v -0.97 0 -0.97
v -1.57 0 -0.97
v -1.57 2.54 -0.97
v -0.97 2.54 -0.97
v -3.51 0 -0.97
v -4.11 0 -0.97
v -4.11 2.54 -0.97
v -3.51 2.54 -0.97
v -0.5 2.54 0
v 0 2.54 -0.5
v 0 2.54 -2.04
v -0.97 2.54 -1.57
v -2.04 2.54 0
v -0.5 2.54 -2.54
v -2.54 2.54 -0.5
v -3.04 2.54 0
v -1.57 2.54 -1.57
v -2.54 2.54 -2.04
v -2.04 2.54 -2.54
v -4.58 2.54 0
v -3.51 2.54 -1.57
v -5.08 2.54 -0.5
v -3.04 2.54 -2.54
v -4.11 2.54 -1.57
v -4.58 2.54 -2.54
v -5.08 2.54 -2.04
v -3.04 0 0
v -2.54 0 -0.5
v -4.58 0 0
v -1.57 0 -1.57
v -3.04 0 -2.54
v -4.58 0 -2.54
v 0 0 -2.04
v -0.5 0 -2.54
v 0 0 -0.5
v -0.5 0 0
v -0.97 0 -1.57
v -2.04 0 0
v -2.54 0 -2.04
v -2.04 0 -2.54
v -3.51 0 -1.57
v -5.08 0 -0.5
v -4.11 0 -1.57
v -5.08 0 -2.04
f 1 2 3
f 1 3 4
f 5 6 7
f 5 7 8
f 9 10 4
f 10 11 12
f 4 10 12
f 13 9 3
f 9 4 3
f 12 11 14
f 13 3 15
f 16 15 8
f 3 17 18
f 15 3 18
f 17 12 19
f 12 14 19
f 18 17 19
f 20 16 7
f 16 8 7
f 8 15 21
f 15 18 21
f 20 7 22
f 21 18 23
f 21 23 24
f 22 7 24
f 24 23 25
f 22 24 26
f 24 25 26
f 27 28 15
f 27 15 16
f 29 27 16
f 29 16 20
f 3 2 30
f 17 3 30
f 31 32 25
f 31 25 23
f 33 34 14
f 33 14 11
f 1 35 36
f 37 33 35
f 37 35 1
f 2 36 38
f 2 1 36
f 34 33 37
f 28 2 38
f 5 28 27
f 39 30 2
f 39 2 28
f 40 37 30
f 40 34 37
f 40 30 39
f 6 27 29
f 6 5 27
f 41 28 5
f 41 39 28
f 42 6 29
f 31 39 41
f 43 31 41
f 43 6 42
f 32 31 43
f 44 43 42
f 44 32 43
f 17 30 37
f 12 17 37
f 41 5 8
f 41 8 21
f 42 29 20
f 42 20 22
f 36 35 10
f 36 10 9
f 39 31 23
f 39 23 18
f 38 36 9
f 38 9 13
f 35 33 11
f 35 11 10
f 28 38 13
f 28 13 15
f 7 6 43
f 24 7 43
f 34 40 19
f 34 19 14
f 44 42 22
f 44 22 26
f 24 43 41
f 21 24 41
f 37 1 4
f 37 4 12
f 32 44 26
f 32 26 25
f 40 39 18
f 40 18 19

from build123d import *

# Parameters (mm, degrees)
SKETCH1_W           = 0.6
SKETCH1_H           = 0.6
BOSS_EXTRUDE1_DEPTH = 2.54


with BuildPart() as part:
    # Sketch1 → Boss-Extrude1 (new body)
    with BuildSketch(Plane(origin=(0, 0, 0), x_dir=(1, 0, 0), z_dir=(0, 1, 0))):
        Polygon((-0.5, 0), (-2.04, 0), (-2.54, 0.5), (-3.04, 0), (-4.58, 0), (-5.08, 0.5), (-5.08, 2.04), (-4.58, 2.54), (-3.04, 2.54), (-2.54, 2.04), (-2.04, 2.54), (-0.5, 2.54), (0, 2.04), (0, 0.5), align=None)
        with Locations((-3.81, 1.27)):
            Rectangle(SKETCH1_W, SKETCH1_H, mode=Mode.SUBTRACT)
        with Locations((-1.27, 1.27)):
            Rectangle(SKETCH1_W, SKETCH1_H, mode=Mode.SUBTRACT)
    extrude(amount=BOSS_EXTRUDE1_DEPTH)


solid = part.part
